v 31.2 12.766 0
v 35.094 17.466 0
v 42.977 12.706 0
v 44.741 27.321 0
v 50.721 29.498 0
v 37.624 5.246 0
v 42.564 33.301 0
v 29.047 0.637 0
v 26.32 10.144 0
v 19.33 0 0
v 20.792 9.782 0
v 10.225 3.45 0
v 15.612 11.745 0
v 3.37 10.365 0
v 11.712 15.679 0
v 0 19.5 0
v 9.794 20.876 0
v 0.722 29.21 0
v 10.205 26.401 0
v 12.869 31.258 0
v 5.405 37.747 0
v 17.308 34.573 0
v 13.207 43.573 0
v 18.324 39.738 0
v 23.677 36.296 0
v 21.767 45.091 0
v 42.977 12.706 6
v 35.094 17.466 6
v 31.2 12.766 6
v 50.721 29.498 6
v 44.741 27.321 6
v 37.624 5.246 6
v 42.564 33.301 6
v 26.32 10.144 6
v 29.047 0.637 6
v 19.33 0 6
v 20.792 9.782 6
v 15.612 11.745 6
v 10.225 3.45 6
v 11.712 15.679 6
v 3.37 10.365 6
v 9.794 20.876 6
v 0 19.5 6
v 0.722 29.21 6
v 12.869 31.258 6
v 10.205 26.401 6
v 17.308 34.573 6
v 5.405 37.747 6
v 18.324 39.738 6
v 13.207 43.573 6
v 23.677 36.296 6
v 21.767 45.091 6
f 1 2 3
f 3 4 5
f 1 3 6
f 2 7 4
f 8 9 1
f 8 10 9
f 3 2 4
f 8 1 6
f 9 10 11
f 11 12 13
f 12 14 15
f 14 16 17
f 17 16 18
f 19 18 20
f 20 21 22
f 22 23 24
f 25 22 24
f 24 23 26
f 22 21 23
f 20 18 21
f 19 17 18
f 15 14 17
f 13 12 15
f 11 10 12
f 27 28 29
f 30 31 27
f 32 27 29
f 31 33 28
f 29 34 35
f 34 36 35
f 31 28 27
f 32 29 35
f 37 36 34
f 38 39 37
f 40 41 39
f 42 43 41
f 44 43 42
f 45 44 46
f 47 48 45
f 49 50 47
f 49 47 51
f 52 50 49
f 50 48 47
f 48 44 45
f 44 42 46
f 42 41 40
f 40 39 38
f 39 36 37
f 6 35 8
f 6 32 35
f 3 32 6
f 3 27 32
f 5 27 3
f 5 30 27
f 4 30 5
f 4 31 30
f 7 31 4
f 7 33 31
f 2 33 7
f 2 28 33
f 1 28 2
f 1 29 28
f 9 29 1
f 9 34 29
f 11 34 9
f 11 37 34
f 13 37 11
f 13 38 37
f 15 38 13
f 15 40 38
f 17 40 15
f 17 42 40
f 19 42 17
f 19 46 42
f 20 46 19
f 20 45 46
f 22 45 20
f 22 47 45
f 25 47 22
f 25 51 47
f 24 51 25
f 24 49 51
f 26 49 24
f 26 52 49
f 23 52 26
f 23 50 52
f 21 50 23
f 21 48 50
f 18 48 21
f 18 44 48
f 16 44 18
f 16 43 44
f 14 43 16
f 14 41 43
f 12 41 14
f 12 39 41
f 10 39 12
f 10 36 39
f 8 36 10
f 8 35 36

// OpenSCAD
$fn = 32;

// ----------------------------------------------------------------------
// Hook plate: curl radius 18 mm over 245 degrees, 9 mm thick band
// ----------------------------------------------------------------------

// --- parameters (mm) ---
profile_height = 6;       // extrusion height
profile_points = 26;      // points of the closed outline

profile = [[18.324, 39.738], [21.767, 45.091], [13.207, 43.573], [5.405, 37.747], [0.722, 29.21], [0, 19.5], [3.37, 10.365], [10.225, 3.45], [19.33, 0], [29.047, 0.637], [37.624, 5.246], [42.977, 12.706], [50.721, 29.498], [44.741, 27.321], [42.564, 33.301], [35.094, 17.466], [31.2, 12.766], [26.32, 10.144], [20.792, 9.782], [15.612, 11.745], [11.712, 15.679], [9.794, 20.876], [10.205, 26.401], [12.869, 31.258], [17.308, 34.573], [23.677, 36.296]];  // single closed polygon, 26 points, counter clockwise

// --- the one profile operation ---
linear_extrude(height = profile_height) polygon(points = profile);
